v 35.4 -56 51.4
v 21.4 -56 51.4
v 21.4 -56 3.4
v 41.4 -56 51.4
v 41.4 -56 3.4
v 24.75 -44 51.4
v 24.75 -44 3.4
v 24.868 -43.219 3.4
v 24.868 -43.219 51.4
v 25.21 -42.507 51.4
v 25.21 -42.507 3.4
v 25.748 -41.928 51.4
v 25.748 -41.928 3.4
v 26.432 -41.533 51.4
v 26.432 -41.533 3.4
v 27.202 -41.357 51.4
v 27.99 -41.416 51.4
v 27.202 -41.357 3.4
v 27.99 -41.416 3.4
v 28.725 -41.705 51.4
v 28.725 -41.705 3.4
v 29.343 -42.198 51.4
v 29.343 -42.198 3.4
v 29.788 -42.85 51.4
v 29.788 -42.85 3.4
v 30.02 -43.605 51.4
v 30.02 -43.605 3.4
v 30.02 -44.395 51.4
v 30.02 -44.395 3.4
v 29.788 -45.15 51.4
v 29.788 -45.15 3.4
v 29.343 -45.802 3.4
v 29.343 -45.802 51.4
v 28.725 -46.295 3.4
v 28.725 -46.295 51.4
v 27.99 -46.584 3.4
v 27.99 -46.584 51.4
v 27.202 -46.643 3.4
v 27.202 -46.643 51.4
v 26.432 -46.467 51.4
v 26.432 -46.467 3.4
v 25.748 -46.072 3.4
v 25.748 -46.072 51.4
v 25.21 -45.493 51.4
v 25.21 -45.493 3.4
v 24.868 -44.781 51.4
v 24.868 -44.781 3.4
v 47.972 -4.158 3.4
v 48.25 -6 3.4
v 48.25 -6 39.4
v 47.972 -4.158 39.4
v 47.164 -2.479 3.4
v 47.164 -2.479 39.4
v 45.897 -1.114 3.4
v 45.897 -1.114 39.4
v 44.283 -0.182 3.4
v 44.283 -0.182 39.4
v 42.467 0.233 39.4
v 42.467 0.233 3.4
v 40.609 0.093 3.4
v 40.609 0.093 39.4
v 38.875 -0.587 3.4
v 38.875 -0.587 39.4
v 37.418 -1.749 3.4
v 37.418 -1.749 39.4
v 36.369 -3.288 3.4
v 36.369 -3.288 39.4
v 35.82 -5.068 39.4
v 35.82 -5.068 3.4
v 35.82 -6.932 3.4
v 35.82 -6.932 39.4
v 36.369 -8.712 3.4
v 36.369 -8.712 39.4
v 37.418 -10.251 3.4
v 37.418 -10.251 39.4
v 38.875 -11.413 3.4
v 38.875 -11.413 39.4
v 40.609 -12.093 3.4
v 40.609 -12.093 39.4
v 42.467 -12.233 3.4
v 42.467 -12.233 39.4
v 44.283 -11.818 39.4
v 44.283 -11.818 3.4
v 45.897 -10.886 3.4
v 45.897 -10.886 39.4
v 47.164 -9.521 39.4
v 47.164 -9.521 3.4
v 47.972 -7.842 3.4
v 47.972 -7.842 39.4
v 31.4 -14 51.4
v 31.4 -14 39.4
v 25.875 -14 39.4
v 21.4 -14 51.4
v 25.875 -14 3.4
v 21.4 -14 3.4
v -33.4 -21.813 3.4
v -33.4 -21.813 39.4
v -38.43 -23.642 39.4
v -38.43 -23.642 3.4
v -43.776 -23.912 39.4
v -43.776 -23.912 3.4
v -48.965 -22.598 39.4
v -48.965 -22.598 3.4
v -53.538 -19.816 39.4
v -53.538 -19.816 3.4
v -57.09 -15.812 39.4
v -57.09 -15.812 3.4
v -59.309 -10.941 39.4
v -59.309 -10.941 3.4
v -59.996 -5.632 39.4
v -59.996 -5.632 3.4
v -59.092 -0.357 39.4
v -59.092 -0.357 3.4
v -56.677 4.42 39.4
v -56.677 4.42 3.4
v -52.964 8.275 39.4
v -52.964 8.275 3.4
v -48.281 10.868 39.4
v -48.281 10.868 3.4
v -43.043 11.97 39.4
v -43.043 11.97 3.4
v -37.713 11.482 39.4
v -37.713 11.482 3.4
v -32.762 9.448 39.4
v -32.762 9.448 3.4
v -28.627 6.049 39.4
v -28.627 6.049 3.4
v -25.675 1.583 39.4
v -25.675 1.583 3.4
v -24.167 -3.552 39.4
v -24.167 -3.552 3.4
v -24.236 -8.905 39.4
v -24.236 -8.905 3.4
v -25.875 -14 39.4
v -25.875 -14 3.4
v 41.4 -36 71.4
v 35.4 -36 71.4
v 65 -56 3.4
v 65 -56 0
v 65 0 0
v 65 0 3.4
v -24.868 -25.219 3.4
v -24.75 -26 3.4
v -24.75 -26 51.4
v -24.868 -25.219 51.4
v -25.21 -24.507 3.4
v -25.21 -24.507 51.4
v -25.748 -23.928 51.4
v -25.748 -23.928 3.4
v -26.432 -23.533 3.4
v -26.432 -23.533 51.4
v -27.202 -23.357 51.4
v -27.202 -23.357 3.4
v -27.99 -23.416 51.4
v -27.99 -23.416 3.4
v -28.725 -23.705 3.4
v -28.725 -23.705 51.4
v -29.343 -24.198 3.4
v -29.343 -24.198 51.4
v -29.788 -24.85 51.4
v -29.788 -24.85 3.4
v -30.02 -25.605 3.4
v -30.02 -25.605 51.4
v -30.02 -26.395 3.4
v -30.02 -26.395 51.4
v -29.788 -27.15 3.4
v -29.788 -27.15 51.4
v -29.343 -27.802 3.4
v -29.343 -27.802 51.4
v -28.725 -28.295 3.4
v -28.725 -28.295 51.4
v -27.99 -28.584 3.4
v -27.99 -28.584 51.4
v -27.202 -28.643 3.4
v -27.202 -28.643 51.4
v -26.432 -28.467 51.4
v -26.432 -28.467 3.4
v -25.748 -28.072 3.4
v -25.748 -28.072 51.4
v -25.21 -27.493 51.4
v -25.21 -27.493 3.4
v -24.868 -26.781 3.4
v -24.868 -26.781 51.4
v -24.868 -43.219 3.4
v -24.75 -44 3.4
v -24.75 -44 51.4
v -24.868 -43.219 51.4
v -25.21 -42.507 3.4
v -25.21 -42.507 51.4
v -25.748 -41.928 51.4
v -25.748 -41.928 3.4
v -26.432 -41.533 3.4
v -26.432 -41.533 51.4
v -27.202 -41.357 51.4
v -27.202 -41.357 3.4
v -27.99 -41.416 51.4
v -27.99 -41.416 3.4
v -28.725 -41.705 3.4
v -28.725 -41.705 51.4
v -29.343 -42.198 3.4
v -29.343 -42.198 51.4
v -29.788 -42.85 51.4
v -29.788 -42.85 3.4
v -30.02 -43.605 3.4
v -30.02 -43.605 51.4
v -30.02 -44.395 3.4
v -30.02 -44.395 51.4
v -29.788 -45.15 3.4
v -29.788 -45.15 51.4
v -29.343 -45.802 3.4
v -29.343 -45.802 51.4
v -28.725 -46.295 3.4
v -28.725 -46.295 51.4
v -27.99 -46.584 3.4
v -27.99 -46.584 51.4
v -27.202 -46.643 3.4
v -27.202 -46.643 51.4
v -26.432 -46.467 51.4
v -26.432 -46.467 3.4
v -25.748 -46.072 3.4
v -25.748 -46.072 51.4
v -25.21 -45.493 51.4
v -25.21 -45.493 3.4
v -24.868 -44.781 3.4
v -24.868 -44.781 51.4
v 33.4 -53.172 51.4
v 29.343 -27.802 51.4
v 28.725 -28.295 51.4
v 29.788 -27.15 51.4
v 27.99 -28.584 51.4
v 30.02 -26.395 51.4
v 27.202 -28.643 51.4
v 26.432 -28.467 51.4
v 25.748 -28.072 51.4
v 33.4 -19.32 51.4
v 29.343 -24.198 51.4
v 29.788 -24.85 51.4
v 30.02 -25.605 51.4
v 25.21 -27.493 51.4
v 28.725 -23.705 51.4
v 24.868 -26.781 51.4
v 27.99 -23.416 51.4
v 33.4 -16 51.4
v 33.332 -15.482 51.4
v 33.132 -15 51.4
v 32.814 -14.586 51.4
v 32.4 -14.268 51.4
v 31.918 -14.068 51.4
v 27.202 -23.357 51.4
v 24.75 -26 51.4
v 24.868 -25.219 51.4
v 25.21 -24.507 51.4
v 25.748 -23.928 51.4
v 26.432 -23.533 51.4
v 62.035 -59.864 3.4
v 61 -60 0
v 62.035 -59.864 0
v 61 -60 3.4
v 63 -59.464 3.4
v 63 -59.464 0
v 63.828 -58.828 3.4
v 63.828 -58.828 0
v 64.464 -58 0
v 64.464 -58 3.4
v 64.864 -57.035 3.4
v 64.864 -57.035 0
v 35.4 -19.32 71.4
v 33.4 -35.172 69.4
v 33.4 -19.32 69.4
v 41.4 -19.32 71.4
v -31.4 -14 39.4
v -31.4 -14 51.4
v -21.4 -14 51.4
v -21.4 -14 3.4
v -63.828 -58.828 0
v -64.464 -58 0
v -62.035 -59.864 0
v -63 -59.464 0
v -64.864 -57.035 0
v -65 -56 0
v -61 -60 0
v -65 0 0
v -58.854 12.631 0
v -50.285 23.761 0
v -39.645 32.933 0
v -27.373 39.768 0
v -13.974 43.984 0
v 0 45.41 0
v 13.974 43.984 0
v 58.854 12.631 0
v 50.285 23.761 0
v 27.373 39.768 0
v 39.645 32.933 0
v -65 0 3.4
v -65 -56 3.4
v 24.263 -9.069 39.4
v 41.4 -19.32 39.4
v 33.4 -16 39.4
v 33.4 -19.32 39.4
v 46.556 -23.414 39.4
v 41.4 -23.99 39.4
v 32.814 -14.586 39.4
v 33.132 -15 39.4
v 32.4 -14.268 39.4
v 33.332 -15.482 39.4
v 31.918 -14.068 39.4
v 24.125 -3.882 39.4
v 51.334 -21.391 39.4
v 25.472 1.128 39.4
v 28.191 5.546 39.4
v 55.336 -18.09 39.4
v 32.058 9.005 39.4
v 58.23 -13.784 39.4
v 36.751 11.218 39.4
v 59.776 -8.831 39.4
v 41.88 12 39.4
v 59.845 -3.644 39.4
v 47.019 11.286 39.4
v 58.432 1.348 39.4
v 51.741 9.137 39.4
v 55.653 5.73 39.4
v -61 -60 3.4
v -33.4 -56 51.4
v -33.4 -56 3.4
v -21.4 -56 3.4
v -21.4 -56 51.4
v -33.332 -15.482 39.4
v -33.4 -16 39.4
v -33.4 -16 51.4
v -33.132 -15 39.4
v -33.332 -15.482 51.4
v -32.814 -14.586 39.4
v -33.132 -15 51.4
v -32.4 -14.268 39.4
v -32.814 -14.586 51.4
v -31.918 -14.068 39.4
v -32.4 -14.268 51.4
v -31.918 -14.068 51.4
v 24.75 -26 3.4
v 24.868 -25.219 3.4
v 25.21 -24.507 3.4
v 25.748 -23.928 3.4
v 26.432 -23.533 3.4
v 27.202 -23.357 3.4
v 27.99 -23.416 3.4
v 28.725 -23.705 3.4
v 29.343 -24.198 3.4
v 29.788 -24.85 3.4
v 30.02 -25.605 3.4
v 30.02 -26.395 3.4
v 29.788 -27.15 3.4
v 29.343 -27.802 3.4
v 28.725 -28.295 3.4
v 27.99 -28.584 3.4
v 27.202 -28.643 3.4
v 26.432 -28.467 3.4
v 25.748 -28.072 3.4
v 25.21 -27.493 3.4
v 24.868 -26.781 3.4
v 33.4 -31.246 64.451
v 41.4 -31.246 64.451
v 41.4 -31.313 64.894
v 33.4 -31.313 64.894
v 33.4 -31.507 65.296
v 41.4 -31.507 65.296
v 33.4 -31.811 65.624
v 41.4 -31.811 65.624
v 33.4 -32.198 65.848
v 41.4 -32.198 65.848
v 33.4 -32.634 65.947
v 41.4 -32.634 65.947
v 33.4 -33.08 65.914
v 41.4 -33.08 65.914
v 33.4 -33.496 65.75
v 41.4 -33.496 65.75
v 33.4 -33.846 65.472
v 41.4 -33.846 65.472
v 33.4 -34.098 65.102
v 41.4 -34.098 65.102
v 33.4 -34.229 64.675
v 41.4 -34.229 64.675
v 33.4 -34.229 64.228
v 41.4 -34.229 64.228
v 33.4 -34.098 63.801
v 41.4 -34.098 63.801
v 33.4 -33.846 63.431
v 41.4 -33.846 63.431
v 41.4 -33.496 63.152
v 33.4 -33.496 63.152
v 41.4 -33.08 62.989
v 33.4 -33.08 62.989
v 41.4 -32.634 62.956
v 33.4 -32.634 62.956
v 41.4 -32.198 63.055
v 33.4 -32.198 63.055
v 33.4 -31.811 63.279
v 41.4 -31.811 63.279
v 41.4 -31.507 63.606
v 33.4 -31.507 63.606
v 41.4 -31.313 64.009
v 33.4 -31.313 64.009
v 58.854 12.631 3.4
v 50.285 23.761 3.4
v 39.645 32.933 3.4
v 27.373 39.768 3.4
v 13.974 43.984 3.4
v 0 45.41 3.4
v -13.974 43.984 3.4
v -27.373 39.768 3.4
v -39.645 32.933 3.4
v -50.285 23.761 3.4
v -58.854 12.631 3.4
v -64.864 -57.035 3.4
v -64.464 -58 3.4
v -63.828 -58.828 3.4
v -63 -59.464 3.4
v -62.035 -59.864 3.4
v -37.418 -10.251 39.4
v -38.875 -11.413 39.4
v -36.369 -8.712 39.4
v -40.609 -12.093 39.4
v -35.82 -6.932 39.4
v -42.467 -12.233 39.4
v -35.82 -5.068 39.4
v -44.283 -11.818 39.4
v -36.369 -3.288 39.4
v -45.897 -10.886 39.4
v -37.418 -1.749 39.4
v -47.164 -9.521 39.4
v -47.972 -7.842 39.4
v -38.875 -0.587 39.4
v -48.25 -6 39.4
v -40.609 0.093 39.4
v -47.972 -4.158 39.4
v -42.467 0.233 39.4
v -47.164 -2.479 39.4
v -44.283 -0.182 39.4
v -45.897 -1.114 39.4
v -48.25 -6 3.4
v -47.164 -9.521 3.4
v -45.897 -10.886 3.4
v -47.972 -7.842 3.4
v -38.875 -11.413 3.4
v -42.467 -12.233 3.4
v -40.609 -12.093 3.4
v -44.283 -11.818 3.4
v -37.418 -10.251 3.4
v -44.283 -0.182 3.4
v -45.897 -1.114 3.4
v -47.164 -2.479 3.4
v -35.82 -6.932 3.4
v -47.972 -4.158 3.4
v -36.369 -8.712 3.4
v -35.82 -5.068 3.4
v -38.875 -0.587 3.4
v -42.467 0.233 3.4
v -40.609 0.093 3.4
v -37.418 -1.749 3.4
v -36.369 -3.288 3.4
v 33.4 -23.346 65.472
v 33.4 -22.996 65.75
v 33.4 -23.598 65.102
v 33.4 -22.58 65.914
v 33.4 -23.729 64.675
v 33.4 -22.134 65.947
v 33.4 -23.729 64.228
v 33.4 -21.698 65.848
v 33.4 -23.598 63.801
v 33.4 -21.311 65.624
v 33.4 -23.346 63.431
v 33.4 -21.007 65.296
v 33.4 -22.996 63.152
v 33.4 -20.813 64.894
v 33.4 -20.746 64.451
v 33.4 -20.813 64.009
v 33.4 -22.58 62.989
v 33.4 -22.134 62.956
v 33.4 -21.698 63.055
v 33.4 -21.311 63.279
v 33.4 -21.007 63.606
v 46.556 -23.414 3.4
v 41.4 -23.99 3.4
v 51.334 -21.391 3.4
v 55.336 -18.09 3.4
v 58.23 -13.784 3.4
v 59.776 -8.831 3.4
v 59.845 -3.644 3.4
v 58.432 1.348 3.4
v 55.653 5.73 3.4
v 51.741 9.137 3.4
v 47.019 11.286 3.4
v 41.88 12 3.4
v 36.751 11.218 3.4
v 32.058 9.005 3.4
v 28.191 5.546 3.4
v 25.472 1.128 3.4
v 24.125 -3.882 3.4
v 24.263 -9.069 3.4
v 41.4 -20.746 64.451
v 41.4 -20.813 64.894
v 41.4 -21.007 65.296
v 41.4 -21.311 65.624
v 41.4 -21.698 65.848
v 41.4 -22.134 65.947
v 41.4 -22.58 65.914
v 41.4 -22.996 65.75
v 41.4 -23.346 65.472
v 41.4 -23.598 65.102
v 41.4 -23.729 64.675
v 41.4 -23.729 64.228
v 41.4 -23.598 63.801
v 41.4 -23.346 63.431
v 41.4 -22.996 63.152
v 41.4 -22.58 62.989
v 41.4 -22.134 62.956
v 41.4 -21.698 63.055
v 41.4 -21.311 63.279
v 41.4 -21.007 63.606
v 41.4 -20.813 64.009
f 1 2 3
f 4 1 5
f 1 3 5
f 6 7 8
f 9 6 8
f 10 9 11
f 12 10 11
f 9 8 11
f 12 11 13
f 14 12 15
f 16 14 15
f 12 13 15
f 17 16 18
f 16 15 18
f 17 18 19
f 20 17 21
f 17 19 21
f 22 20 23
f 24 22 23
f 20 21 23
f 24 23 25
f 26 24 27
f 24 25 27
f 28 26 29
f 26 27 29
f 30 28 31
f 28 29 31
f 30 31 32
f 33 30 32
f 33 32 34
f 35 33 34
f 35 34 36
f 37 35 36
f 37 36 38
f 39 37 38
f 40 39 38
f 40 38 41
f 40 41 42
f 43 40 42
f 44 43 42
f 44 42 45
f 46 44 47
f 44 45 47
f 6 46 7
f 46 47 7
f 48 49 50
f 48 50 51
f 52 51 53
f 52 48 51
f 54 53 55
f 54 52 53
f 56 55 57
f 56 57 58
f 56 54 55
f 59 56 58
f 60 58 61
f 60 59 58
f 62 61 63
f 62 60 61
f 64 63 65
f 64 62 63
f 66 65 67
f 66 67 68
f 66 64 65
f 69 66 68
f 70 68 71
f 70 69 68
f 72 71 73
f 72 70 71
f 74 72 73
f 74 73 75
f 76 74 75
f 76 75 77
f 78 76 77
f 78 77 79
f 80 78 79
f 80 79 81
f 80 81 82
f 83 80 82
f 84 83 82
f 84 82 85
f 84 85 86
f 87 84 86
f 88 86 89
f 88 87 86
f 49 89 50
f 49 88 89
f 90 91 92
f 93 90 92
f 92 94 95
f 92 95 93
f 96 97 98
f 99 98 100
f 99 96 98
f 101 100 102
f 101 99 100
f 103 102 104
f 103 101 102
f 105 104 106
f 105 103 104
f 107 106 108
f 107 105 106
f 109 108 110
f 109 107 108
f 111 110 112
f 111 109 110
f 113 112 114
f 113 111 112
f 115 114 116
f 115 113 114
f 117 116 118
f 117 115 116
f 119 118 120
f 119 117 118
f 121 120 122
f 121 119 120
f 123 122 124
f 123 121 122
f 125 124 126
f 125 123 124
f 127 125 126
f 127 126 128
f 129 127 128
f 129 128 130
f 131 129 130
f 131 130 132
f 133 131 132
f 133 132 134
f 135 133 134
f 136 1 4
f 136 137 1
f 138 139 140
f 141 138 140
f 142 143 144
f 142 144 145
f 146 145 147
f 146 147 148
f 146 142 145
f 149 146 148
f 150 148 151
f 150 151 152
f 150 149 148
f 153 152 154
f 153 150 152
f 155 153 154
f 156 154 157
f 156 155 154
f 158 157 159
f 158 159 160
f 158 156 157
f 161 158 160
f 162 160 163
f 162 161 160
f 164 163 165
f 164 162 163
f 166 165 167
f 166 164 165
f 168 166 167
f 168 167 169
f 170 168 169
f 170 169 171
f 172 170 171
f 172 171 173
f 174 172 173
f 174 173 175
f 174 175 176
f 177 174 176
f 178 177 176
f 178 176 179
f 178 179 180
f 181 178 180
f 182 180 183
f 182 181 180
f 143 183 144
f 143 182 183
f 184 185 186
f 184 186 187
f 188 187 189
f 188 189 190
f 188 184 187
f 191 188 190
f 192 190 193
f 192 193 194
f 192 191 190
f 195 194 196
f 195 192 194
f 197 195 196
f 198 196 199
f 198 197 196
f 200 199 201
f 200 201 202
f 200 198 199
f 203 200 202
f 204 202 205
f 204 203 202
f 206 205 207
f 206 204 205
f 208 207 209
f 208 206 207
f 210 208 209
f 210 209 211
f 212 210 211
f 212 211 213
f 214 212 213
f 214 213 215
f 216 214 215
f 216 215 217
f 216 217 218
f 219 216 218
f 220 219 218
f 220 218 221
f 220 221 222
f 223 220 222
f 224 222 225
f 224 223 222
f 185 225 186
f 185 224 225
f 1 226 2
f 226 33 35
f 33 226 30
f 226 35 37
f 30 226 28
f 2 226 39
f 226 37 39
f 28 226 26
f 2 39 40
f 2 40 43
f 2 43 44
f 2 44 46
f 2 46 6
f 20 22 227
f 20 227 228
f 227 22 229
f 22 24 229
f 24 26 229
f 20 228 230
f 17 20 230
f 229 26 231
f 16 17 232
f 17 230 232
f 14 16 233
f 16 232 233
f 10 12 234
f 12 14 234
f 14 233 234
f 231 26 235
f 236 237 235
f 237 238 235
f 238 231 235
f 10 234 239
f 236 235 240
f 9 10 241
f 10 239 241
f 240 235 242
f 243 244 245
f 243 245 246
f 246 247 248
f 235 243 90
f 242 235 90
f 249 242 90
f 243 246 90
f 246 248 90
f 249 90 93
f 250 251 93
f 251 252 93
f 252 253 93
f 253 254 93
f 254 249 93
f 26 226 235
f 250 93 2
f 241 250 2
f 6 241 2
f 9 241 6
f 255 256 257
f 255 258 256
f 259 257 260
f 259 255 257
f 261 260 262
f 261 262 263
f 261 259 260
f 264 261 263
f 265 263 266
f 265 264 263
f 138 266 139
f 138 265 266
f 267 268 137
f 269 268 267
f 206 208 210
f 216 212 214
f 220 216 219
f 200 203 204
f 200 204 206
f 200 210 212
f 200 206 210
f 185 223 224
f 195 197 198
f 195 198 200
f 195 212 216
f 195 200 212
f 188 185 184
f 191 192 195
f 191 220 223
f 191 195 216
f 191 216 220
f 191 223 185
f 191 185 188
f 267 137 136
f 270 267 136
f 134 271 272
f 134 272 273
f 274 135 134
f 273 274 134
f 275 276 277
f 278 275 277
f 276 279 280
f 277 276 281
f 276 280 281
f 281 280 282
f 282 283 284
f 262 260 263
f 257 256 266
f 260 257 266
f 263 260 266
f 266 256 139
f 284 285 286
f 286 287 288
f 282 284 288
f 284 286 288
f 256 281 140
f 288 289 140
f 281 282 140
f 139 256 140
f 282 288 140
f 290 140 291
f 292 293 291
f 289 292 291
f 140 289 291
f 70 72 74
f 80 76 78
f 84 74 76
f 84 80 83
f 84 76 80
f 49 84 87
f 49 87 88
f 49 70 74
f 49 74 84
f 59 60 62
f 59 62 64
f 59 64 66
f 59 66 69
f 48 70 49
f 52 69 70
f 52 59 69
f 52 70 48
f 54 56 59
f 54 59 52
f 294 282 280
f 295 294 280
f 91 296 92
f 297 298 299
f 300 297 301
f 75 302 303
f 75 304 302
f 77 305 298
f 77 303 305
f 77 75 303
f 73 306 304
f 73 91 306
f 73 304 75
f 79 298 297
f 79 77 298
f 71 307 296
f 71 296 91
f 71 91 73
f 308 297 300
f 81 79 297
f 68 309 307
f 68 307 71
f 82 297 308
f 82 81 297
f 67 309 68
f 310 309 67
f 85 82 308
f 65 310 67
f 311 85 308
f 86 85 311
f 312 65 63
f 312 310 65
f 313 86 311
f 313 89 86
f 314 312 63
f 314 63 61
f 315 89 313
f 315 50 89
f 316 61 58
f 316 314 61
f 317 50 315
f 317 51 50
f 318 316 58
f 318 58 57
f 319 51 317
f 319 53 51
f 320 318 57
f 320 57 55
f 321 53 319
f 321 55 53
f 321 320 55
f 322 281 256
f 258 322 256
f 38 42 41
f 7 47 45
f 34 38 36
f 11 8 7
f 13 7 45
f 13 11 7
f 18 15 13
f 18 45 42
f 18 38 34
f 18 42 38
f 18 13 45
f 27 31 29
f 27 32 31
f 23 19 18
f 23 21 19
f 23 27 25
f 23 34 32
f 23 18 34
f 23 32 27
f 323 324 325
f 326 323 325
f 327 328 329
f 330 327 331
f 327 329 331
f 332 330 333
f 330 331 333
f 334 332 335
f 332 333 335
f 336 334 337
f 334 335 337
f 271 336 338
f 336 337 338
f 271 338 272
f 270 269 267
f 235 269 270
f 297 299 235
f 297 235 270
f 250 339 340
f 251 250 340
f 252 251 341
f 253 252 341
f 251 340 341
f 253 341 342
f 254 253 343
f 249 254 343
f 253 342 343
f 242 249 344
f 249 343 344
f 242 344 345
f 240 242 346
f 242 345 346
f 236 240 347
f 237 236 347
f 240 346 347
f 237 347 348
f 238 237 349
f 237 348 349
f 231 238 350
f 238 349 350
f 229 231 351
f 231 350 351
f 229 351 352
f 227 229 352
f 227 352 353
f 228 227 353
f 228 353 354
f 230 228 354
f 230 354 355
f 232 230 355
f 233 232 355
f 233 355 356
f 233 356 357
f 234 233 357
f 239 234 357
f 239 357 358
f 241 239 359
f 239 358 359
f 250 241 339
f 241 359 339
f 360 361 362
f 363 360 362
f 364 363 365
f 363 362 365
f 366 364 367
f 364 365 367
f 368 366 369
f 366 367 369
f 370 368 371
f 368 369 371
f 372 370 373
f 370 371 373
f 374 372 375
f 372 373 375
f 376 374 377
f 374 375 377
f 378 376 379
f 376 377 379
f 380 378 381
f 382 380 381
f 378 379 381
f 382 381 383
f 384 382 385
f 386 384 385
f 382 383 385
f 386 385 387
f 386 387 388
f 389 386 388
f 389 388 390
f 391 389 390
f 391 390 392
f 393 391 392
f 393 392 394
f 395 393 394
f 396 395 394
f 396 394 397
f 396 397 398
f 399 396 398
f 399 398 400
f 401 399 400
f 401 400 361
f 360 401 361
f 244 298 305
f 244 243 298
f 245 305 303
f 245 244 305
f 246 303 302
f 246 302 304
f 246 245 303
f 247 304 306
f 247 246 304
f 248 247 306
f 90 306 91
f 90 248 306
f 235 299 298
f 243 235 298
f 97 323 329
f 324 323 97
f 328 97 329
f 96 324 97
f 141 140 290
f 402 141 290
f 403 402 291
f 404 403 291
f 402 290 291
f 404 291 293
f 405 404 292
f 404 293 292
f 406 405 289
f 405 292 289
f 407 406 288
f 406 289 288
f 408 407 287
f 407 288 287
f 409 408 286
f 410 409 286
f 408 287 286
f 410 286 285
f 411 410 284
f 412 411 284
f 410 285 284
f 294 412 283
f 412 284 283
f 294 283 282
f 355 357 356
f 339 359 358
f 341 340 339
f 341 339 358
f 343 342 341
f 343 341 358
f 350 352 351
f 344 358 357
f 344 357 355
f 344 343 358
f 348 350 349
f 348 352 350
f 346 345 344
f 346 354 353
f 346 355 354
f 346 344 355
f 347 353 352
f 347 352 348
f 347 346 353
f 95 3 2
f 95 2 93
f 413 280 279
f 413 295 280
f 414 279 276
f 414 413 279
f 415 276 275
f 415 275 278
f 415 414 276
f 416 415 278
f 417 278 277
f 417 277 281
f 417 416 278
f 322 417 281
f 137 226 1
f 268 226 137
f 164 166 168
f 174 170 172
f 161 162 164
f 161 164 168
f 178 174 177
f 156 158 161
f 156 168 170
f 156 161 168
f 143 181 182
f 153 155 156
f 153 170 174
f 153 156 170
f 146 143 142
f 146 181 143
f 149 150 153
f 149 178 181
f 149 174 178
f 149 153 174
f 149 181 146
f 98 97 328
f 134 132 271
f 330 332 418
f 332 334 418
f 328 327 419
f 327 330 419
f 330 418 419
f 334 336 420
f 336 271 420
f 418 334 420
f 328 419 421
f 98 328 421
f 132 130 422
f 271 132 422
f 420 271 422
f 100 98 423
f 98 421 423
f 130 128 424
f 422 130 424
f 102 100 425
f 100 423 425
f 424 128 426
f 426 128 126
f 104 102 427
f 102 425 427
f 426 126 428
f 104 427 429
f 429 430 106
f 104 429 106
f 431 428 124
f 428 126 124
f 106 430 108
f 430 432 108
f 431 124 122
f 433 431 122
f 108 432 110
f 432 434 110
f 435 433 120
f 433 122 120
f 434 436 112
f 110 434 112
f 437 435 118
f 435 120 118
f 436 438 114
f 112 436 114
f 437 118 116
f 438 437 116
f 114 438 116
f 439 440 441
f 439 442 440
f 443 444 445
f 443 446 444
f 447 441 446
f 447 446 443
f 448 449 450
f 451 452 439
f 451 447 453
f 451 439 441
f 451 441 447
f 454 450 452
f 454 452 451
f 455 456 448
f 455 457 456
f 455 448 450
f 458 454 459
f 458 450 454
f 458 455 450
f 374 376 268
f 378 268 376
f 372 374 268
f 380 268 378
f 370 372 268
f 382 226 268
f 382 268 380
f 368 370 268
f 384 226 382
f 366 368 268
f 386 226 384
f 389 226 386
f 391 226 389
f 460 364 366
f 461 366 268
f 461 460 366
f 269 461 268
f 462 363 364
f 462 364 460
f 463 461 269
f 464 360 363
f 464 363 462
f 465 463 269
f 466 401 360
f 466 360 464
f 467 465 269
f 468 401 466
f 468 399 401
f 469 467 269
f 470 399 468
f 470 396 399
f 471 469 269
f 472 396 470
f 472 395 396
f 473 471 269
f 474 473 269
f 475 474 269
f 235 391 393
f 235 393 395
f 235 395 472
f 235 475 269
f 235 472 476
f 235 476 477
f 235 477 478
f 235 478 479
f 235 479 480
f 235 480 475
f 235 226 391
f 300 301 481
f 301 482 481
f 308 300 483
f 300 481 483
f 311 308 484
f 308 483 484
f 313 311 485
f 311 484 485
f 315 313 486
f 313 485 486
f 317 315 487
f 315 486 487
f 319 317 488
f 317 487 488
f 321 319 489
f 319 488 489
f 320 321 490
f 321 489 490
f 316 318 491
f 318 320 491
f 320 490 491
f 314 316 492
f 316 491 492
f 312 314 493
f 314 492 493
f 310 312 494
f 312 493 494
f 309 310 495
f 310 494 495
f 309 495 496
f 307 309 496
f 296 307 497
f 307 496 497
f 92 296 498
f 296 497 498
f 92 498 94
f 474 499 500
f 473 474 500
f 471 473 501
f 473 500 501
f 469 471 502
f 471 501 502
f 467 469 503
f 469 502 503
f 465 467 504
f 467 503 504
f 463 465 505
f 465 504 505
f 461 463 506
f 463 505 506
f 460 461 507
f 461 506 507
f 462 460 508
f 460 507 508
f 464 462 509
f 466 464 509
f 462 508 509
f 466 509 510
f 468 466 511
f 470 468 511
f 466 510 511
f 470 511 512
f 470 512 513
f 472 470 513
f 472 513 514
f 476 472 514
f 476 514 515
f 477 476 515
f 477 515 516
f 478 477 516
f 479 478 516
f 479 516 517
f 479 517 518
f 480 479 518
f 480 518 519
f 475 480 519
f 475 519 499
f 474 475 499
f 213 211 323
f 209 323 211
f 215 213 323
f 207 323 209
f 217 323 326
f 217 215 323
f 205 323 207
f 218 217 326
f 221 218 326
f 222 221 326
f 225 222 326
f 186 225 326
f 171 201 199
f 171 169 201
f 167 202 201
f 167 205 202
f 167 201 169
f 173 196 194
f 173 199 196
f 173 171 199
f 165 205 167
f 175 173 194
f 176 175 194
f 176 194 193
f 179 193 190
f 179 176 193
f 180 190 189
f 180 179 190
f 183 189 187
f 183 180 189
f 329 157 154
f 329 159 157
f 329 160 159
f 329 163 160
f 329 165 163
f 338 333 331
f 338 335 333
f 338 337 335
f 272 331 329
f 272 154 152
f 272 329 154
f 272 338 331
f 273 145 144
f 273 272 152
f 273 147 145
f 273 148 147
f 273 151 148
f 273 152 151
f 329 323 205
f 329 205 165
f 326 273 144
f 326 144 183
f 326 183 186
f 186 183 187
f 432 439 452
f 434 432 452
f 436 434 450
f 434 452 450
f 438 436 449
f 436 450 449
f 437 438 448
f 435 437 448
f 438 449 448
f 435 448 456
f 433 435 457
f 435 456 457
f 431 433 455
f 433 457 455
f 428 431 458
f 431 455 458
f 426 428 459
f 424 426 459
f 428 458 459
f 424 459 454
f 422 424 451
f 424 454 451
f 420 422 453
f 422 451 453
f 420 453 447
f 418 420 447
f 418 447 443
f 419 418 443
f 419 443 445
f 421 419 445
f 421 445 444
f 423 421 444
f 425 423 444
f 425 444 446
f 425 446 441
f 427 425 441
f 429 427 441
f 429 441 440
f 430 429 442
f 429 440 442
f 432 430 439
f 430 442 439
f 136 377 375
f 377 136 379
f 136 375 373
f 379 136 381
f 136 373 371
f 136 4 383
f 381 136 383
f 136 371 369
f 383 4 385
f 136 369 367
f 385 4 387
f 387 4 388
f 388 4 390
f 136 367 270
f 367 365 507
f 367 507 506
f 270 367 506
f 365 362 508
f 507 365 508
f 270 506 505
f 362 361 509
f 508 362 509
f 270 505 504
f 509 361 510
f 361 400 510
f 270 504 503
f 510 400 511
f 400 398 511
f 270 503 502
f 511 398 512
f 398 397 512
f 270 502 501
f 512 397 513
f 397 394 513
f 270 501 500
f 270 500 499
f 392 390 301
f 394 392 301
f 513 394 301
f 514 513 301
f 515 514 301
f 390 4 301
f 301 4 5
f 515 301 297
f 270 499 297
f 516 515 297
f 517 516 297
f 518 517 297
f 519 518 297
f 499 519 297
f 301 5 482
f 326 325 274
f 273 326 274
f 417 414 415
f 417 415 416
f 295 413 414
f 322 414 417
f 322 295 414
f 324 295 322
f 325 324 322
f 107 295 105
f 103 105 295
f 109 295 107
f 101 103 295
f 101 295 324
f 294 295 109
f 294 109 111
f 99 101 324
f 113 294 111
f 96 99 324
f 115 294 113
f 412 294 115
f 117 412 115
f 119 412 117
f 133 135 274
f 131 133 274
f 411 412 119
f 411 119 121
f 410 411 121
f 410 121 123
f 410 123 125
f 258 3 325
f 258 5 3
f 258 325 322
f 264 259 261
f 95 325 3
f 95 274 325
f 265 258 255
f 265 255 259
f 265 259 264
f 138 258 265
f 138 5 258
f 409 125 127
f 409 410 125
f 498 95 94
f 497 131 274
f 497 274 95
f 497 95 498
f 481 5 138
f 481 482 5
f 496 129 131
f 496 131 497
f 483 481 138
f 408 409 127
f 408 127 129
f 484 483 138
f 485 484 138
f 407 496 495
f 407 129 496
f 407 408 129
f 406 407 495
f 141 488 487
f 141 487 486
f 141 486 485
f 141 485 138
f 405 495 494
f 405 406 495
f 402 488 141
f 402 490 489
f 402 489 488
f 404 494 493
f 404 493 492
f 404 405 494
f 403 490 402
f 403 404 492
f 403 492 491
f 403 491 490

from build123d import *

# Parameters (mm, degrees)
PAD_DEPTH       = 3.4
FILLET_R        = 4
SKETCH001_R     = 18
SKETCH001_R_2   = 6.25
PAD001_DEPTH    = 36
SKETCH002_W     = 12
SKETCH002_H     = 42
SKETCH002_R     = 2.65
PAD002_DEPTH    = 48
FILLET002_R     = 2
SKETCH004_W     = 8
SKETCH004_H     = 36.680408
PAD010_DEPTH    = 68
CHAMFER_SIZE    = 20
CHAMFER001_SIZE = 2
SKETCH005_R     = 1.5
POCKET_DEPTH    = 10


with BuildPart() as part:
    # Sketch → Pad (new body)
    with BuildSketch(Plane.XY):
        with BuildLine():
            Line((-65, 0), (-65, -60))
            Line((-65, -60), (65, -60))
            Line((65, -60), (65, 0))
            ThreePointArc((65, 0), (0, 45.409517), (-65, 0))
        make_face()
    extrude(amount=PAD_DEPTH)

    # Fillet
    fillet_edges = [part.edges().sort_by_distance(p)[0] for p in [
        (65, -60, 1.7),
        (-65, -60, 1.7),
    ]]
    fillet(fillet_edges, radius=FILLET_R)

    # Sketch001 (on Face6 of Pad) → Pad001 (join)
    with BuildSketch(Plane.XY.offset(3.4)):
        with Locations((42, -6)):
            Circle(SKETCH001_R)
        with Locations((42, -6)):
            Circle(SKETCH001_R_2, mode=Mode.SUBTRACT)
    pad001 = extrude(amount=PAD001_DEPTH)

    # Mirrored: Pad001 across YZ
    add(pad001.mirror(Plane.YZ))

    # Sketch002 (on Face5 of Mirrored) → Pad002 (join)
    with BuildSketch(Plane.XY.offset(3.4)):
        with Locations((-27.4, -35)):
            Rectangle(SKETCH002_W, SKETCH002_H)
        with Locations((-27.4, -26)):
            Circle(SKETCH002_R, mode=Mode.SUBTRACT)
        with Locations((-27.4, -44)):
            Circle(SKETCH002_R, mode=Mode.SUBTRACT)
    pad002 = extrude(amount=PAD002_DEPTH)

    # Mirrored001: Pad002 across Sketch002 V_Axis
    add(pad002.mirror(Plane(origin=(0, 0, 3.4), x_dir=(0, 0, 1), z_dir=(1, 0, 0))))

    # Fillet002
    fillet002_edges = [part.edges().sort_by_distance(p)[0] for p in [
        (33.4, -14, 45.4),
        (-33.4, -14, 45.4),
    ]]
    fillet(fillet002_edges, radius=FILLET002_R)

    # Sketch004 (on Face6 of Fillet002) → Pad010 (join)
    with BuildSketch(Plane.XY.offset(3.4)):
        with Locations((37.4, -37.659796)):
            Rectangle(SKETCH004_W, SKETCH004_H)
    extrude(amount=PAD010_DEPTH)

    # Chamfer
    chamfer_edges = [part.edges().sort_by_distance(p)[0] for p in [
        (37.4, -56, 71.4),
    ]]
    chamfer(chamfer_edges, length=CHAMFER_SIZE)

    # Chamfer001
    chamfer001_edges = [part.edges().sort_by_distance(p)[0] for p in [
        (33.4, -46, 61.4),
        (33.4, -27.659796, 71.4),
    ]]
    chamfer(chamfer001_edges, length=CHAMFER001_SIZE)

    # Sketch005 (on Face4 of Chamfer001) → Pocket (cut)
    with BuildSketch(Plane.YZ.offset(41.4)):
        with Locations((-32.7462, 64.451439)):
            Circle(SKETCH005_R)
        with Locations((-22.2462, 64.451439)):
            Circle(SKETCH005_R)
    extrude(amount=-POCKET_DEPTH, mode=Mode.SUBTRACT)


solid = part.part
